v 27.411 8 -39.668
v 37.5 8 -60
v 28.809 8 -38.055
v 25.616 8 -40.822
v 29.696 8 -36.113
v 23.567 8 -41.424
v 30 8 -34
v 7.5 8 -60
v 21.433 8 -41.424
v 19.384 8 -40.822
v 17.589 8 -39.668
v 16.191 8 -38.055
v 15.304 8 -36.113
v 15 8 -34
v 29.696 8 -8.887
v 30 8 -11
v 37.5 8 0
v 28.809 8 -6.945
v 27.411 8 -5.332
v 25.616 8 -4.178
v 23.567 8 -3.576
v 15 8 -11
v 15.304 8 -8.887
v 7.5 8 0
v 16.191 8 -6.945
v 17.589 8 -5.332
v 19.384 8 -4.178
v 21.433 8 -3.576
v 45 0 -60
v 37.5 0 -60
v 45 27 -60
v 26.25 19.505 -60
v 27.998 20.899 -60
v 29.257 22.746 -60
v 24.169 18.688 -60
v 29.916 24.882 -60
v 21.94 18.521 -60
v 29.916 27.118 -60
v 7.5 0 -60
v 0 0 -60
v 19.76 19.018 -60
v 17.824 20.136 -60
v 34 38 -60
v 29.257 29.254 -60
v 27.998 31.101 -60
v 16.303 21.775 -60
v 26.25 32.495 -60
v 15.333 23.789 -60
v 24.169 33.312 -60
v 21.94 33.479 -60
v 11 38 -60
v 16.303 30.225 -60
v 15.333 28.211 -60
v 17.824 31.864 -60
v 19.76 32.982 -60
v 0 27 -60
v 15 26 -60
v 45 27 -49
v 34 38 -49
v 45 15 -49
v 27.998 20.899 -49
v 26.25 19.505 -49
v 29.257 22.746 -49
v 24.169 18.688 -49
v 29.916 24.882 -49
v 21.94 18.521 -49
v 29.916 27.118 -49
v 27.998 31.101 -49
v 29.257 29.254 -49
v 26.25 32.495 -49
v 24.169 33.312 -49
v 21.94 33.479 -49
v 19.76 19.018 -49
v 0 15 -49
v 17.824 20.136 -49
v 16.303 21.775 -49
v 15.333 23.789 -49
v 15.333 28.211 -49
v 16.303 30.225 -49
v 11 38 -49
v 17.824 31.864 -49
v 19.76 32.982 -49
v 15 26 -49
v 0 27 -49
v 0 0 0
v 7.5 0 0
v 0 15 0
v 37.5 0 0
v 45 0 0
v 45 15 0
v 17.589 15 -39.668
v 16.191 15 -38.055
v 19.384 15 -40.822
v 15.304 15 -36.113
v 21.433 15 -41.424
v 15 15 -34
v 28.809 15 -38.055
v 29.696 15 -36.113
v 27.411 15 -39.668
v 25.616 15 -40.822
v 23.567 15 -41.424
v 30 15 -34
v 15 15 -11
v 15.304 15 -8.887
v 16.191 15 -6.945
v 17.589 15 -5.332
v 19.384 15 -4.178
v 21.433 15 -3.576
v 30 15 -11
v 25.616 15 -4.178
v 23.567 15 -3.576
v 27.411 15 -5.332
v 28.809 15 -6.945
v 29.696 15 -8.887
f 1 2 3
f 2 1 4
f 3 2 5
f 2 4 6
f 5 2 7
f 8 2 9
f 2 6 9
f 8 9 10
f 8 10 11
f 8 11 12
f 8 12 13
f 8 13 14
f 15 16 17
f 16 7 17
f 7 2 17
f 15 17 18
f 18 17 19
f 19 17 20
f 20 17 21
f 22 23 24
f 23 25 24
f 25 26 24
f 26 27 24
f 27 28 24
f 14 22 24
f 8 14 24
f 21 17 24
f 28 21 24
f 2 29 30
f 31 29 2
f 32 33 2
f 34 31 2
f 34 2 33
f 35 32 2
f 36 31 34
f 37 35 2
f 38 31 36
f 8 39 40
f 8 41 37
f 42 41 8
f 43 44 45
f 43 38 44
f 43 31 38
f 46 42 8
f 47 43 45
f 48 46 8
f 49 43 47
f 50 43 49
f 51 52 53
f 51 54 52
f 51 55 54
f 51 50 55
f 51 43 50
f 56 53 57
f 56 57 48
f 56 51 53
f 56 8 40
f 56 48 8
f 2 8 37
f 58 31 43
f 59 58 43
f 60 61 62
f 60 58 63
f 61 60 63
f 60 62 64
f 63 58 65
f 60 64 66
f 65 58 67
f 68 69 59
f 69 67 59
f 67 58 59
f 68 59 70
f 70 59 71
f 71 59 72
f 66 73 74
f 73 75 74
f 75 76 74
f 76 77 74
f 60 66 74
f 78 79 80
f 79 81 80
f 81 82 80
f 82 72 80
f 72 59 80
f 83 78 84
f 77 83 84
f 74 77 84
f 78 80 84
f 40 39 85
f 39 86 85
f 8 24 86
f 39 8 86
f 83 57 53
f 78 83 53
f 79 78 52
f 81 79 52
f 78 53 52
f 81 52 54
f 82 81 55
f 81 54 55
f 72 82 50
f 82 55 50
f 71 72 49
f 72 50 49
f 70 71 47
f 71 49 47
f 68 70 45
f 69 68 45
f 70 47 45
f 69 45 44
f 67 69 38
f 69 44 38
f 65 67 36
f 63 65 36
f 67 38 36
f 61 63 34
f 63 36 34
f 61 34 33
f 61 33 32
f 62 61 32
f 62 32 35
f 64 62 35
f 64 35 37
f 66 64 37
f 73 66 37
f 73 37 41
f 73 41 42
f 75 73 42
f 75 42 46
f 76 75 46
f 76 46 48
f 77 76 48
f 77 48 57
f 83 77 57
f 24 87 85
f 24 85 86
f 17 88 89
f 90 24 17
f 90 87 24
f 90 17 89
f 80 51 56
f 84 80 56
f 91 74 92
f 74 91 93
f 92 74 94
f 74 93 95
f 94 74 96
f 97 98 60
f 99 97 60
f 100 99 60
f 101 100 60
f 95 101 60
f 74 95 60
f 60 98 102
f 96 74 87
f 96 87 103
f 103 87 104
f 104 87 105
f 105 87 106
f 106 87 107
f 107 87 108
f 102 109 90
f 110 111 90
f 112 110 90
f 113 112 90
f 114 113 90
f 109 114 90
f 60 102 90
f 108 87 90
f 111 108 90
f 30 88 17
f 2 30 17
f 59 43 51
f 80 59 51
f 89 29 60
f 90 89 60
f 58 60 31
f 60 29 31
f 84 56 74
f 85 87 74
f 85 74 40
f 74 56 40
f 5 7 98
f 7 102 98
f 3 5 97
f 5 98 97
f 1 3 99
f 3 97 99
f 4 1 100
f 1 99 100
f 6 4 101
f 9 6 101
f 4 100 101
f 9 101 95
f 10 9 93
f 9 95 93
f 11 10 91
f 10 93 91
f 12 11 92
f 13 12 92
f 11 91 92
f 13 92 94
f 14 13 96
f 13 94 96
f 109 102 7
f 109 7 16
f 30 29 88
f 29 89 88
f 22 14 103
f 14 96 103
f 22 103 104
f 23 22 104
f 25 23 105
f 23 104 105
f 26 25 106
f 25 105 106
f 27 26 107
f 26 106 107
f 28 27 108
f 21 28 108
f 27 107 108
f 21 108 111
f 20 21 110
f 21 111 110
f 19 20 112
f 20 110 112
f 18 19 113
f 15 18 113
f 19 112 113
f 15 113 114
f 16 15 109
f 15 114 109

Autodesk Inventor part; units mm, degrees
ref_plane "YZ Plane" through (0, 0, 0) normal (1, 0, 0) x (0, 1, 0)
ref_plane "XZ Plane" through (0, 0, 0) normal (0, 1, 0) x (-1, 0, 0)
ref_plane "XY Plane" through (0, 0, 0) normal (0, 0, 1) x (1, 0, 0)
sketch "草圖1" plane through (0, 0, 0) normal (0, 0, 1) x (1, 0, 0)
  line L0 (0, 0) -> (0, 15)
  line L1 (0, 15) -> (45, 15)
  line L2 (45, 15) -> (45, 0)
  line L3 (45, 0) -> (37.5, 0)
  line L4 (37.5, 0) -> (37.5, 8)
  line L5 (37.5, 8) -> (7.5, 8)
  line L6 (7.5, 8) -> (7.5, 0)
  line L7 (7.5, 0) -> (0, 0)
  dimension "d0" = 15
  dimension "d1" = 8
  dimension "d2" = 30
  dimension "d3" = 45
  dimension "d4" = 7.5
extrude "擠出1" add sketch "草圖1" against normal blind 60
sketch "草圖2" plane through (0, 15, 0) normal (0, 1, 0) x (1, 0, 0)
  line L0 (15, 34) -> (15, 11)
  line L1 (30, 34) -> (30, 11)
  arc A0 (30, 34) -> (15, 34) centre (22.5, 34) ccw
  arc A1 (15, 11) -> (30, 11) centre (22.5, 11) ccw
  line L2 (0, 0) -> (45, 0) projected
  line L3 (0, 0) -> (0, 60) projected
  dimension "d7" = 11
  dimension "d8" = 15
  dimension "d9" = 7.5
  dimension "d10" = 23
  dimension "d11" = 7.5
  dimension "d12" = 22.5
extrude "擠出2" cut sketch "草圖2" against normal blind 7
sketch "草圖3" plane through (0, 0, -60) normal (0, 0, -1) x (-1, 0, 0)
  line L0 (-45, 15) -> (-45, 0) projected
  line L1 (-45, 15) -> (-45, 27)
  line L2 (-45, 27) -> (-34, 38)
  line L3 (-34, 38) -> (-11, 38)
  line L4 (-11, 38) -> (0, 27)
  line L5 (0, 27) -> (0, 15)
  line L6 (0, 15) -> (-45, 15) projected
  line L7 (0, 15) -> (-45, 15)
  circle A0 centre (-22.5, 26) radius 7.5
  line L8 (-7.5, 0) -> (0, 0) projected
  dimension "d15" = 11
  dimension "d16" = 11
  dimension "d17" = 11
  dimension "d18" = 11
  dimension "d19" = 38
  dimension "d20" = 11
  dimension "d21" = 15
  dimension "d22" = 22.5
extrude "擠出3" add sketch "草圖3" against normal blind 11
properties part number "410571040練習二"
